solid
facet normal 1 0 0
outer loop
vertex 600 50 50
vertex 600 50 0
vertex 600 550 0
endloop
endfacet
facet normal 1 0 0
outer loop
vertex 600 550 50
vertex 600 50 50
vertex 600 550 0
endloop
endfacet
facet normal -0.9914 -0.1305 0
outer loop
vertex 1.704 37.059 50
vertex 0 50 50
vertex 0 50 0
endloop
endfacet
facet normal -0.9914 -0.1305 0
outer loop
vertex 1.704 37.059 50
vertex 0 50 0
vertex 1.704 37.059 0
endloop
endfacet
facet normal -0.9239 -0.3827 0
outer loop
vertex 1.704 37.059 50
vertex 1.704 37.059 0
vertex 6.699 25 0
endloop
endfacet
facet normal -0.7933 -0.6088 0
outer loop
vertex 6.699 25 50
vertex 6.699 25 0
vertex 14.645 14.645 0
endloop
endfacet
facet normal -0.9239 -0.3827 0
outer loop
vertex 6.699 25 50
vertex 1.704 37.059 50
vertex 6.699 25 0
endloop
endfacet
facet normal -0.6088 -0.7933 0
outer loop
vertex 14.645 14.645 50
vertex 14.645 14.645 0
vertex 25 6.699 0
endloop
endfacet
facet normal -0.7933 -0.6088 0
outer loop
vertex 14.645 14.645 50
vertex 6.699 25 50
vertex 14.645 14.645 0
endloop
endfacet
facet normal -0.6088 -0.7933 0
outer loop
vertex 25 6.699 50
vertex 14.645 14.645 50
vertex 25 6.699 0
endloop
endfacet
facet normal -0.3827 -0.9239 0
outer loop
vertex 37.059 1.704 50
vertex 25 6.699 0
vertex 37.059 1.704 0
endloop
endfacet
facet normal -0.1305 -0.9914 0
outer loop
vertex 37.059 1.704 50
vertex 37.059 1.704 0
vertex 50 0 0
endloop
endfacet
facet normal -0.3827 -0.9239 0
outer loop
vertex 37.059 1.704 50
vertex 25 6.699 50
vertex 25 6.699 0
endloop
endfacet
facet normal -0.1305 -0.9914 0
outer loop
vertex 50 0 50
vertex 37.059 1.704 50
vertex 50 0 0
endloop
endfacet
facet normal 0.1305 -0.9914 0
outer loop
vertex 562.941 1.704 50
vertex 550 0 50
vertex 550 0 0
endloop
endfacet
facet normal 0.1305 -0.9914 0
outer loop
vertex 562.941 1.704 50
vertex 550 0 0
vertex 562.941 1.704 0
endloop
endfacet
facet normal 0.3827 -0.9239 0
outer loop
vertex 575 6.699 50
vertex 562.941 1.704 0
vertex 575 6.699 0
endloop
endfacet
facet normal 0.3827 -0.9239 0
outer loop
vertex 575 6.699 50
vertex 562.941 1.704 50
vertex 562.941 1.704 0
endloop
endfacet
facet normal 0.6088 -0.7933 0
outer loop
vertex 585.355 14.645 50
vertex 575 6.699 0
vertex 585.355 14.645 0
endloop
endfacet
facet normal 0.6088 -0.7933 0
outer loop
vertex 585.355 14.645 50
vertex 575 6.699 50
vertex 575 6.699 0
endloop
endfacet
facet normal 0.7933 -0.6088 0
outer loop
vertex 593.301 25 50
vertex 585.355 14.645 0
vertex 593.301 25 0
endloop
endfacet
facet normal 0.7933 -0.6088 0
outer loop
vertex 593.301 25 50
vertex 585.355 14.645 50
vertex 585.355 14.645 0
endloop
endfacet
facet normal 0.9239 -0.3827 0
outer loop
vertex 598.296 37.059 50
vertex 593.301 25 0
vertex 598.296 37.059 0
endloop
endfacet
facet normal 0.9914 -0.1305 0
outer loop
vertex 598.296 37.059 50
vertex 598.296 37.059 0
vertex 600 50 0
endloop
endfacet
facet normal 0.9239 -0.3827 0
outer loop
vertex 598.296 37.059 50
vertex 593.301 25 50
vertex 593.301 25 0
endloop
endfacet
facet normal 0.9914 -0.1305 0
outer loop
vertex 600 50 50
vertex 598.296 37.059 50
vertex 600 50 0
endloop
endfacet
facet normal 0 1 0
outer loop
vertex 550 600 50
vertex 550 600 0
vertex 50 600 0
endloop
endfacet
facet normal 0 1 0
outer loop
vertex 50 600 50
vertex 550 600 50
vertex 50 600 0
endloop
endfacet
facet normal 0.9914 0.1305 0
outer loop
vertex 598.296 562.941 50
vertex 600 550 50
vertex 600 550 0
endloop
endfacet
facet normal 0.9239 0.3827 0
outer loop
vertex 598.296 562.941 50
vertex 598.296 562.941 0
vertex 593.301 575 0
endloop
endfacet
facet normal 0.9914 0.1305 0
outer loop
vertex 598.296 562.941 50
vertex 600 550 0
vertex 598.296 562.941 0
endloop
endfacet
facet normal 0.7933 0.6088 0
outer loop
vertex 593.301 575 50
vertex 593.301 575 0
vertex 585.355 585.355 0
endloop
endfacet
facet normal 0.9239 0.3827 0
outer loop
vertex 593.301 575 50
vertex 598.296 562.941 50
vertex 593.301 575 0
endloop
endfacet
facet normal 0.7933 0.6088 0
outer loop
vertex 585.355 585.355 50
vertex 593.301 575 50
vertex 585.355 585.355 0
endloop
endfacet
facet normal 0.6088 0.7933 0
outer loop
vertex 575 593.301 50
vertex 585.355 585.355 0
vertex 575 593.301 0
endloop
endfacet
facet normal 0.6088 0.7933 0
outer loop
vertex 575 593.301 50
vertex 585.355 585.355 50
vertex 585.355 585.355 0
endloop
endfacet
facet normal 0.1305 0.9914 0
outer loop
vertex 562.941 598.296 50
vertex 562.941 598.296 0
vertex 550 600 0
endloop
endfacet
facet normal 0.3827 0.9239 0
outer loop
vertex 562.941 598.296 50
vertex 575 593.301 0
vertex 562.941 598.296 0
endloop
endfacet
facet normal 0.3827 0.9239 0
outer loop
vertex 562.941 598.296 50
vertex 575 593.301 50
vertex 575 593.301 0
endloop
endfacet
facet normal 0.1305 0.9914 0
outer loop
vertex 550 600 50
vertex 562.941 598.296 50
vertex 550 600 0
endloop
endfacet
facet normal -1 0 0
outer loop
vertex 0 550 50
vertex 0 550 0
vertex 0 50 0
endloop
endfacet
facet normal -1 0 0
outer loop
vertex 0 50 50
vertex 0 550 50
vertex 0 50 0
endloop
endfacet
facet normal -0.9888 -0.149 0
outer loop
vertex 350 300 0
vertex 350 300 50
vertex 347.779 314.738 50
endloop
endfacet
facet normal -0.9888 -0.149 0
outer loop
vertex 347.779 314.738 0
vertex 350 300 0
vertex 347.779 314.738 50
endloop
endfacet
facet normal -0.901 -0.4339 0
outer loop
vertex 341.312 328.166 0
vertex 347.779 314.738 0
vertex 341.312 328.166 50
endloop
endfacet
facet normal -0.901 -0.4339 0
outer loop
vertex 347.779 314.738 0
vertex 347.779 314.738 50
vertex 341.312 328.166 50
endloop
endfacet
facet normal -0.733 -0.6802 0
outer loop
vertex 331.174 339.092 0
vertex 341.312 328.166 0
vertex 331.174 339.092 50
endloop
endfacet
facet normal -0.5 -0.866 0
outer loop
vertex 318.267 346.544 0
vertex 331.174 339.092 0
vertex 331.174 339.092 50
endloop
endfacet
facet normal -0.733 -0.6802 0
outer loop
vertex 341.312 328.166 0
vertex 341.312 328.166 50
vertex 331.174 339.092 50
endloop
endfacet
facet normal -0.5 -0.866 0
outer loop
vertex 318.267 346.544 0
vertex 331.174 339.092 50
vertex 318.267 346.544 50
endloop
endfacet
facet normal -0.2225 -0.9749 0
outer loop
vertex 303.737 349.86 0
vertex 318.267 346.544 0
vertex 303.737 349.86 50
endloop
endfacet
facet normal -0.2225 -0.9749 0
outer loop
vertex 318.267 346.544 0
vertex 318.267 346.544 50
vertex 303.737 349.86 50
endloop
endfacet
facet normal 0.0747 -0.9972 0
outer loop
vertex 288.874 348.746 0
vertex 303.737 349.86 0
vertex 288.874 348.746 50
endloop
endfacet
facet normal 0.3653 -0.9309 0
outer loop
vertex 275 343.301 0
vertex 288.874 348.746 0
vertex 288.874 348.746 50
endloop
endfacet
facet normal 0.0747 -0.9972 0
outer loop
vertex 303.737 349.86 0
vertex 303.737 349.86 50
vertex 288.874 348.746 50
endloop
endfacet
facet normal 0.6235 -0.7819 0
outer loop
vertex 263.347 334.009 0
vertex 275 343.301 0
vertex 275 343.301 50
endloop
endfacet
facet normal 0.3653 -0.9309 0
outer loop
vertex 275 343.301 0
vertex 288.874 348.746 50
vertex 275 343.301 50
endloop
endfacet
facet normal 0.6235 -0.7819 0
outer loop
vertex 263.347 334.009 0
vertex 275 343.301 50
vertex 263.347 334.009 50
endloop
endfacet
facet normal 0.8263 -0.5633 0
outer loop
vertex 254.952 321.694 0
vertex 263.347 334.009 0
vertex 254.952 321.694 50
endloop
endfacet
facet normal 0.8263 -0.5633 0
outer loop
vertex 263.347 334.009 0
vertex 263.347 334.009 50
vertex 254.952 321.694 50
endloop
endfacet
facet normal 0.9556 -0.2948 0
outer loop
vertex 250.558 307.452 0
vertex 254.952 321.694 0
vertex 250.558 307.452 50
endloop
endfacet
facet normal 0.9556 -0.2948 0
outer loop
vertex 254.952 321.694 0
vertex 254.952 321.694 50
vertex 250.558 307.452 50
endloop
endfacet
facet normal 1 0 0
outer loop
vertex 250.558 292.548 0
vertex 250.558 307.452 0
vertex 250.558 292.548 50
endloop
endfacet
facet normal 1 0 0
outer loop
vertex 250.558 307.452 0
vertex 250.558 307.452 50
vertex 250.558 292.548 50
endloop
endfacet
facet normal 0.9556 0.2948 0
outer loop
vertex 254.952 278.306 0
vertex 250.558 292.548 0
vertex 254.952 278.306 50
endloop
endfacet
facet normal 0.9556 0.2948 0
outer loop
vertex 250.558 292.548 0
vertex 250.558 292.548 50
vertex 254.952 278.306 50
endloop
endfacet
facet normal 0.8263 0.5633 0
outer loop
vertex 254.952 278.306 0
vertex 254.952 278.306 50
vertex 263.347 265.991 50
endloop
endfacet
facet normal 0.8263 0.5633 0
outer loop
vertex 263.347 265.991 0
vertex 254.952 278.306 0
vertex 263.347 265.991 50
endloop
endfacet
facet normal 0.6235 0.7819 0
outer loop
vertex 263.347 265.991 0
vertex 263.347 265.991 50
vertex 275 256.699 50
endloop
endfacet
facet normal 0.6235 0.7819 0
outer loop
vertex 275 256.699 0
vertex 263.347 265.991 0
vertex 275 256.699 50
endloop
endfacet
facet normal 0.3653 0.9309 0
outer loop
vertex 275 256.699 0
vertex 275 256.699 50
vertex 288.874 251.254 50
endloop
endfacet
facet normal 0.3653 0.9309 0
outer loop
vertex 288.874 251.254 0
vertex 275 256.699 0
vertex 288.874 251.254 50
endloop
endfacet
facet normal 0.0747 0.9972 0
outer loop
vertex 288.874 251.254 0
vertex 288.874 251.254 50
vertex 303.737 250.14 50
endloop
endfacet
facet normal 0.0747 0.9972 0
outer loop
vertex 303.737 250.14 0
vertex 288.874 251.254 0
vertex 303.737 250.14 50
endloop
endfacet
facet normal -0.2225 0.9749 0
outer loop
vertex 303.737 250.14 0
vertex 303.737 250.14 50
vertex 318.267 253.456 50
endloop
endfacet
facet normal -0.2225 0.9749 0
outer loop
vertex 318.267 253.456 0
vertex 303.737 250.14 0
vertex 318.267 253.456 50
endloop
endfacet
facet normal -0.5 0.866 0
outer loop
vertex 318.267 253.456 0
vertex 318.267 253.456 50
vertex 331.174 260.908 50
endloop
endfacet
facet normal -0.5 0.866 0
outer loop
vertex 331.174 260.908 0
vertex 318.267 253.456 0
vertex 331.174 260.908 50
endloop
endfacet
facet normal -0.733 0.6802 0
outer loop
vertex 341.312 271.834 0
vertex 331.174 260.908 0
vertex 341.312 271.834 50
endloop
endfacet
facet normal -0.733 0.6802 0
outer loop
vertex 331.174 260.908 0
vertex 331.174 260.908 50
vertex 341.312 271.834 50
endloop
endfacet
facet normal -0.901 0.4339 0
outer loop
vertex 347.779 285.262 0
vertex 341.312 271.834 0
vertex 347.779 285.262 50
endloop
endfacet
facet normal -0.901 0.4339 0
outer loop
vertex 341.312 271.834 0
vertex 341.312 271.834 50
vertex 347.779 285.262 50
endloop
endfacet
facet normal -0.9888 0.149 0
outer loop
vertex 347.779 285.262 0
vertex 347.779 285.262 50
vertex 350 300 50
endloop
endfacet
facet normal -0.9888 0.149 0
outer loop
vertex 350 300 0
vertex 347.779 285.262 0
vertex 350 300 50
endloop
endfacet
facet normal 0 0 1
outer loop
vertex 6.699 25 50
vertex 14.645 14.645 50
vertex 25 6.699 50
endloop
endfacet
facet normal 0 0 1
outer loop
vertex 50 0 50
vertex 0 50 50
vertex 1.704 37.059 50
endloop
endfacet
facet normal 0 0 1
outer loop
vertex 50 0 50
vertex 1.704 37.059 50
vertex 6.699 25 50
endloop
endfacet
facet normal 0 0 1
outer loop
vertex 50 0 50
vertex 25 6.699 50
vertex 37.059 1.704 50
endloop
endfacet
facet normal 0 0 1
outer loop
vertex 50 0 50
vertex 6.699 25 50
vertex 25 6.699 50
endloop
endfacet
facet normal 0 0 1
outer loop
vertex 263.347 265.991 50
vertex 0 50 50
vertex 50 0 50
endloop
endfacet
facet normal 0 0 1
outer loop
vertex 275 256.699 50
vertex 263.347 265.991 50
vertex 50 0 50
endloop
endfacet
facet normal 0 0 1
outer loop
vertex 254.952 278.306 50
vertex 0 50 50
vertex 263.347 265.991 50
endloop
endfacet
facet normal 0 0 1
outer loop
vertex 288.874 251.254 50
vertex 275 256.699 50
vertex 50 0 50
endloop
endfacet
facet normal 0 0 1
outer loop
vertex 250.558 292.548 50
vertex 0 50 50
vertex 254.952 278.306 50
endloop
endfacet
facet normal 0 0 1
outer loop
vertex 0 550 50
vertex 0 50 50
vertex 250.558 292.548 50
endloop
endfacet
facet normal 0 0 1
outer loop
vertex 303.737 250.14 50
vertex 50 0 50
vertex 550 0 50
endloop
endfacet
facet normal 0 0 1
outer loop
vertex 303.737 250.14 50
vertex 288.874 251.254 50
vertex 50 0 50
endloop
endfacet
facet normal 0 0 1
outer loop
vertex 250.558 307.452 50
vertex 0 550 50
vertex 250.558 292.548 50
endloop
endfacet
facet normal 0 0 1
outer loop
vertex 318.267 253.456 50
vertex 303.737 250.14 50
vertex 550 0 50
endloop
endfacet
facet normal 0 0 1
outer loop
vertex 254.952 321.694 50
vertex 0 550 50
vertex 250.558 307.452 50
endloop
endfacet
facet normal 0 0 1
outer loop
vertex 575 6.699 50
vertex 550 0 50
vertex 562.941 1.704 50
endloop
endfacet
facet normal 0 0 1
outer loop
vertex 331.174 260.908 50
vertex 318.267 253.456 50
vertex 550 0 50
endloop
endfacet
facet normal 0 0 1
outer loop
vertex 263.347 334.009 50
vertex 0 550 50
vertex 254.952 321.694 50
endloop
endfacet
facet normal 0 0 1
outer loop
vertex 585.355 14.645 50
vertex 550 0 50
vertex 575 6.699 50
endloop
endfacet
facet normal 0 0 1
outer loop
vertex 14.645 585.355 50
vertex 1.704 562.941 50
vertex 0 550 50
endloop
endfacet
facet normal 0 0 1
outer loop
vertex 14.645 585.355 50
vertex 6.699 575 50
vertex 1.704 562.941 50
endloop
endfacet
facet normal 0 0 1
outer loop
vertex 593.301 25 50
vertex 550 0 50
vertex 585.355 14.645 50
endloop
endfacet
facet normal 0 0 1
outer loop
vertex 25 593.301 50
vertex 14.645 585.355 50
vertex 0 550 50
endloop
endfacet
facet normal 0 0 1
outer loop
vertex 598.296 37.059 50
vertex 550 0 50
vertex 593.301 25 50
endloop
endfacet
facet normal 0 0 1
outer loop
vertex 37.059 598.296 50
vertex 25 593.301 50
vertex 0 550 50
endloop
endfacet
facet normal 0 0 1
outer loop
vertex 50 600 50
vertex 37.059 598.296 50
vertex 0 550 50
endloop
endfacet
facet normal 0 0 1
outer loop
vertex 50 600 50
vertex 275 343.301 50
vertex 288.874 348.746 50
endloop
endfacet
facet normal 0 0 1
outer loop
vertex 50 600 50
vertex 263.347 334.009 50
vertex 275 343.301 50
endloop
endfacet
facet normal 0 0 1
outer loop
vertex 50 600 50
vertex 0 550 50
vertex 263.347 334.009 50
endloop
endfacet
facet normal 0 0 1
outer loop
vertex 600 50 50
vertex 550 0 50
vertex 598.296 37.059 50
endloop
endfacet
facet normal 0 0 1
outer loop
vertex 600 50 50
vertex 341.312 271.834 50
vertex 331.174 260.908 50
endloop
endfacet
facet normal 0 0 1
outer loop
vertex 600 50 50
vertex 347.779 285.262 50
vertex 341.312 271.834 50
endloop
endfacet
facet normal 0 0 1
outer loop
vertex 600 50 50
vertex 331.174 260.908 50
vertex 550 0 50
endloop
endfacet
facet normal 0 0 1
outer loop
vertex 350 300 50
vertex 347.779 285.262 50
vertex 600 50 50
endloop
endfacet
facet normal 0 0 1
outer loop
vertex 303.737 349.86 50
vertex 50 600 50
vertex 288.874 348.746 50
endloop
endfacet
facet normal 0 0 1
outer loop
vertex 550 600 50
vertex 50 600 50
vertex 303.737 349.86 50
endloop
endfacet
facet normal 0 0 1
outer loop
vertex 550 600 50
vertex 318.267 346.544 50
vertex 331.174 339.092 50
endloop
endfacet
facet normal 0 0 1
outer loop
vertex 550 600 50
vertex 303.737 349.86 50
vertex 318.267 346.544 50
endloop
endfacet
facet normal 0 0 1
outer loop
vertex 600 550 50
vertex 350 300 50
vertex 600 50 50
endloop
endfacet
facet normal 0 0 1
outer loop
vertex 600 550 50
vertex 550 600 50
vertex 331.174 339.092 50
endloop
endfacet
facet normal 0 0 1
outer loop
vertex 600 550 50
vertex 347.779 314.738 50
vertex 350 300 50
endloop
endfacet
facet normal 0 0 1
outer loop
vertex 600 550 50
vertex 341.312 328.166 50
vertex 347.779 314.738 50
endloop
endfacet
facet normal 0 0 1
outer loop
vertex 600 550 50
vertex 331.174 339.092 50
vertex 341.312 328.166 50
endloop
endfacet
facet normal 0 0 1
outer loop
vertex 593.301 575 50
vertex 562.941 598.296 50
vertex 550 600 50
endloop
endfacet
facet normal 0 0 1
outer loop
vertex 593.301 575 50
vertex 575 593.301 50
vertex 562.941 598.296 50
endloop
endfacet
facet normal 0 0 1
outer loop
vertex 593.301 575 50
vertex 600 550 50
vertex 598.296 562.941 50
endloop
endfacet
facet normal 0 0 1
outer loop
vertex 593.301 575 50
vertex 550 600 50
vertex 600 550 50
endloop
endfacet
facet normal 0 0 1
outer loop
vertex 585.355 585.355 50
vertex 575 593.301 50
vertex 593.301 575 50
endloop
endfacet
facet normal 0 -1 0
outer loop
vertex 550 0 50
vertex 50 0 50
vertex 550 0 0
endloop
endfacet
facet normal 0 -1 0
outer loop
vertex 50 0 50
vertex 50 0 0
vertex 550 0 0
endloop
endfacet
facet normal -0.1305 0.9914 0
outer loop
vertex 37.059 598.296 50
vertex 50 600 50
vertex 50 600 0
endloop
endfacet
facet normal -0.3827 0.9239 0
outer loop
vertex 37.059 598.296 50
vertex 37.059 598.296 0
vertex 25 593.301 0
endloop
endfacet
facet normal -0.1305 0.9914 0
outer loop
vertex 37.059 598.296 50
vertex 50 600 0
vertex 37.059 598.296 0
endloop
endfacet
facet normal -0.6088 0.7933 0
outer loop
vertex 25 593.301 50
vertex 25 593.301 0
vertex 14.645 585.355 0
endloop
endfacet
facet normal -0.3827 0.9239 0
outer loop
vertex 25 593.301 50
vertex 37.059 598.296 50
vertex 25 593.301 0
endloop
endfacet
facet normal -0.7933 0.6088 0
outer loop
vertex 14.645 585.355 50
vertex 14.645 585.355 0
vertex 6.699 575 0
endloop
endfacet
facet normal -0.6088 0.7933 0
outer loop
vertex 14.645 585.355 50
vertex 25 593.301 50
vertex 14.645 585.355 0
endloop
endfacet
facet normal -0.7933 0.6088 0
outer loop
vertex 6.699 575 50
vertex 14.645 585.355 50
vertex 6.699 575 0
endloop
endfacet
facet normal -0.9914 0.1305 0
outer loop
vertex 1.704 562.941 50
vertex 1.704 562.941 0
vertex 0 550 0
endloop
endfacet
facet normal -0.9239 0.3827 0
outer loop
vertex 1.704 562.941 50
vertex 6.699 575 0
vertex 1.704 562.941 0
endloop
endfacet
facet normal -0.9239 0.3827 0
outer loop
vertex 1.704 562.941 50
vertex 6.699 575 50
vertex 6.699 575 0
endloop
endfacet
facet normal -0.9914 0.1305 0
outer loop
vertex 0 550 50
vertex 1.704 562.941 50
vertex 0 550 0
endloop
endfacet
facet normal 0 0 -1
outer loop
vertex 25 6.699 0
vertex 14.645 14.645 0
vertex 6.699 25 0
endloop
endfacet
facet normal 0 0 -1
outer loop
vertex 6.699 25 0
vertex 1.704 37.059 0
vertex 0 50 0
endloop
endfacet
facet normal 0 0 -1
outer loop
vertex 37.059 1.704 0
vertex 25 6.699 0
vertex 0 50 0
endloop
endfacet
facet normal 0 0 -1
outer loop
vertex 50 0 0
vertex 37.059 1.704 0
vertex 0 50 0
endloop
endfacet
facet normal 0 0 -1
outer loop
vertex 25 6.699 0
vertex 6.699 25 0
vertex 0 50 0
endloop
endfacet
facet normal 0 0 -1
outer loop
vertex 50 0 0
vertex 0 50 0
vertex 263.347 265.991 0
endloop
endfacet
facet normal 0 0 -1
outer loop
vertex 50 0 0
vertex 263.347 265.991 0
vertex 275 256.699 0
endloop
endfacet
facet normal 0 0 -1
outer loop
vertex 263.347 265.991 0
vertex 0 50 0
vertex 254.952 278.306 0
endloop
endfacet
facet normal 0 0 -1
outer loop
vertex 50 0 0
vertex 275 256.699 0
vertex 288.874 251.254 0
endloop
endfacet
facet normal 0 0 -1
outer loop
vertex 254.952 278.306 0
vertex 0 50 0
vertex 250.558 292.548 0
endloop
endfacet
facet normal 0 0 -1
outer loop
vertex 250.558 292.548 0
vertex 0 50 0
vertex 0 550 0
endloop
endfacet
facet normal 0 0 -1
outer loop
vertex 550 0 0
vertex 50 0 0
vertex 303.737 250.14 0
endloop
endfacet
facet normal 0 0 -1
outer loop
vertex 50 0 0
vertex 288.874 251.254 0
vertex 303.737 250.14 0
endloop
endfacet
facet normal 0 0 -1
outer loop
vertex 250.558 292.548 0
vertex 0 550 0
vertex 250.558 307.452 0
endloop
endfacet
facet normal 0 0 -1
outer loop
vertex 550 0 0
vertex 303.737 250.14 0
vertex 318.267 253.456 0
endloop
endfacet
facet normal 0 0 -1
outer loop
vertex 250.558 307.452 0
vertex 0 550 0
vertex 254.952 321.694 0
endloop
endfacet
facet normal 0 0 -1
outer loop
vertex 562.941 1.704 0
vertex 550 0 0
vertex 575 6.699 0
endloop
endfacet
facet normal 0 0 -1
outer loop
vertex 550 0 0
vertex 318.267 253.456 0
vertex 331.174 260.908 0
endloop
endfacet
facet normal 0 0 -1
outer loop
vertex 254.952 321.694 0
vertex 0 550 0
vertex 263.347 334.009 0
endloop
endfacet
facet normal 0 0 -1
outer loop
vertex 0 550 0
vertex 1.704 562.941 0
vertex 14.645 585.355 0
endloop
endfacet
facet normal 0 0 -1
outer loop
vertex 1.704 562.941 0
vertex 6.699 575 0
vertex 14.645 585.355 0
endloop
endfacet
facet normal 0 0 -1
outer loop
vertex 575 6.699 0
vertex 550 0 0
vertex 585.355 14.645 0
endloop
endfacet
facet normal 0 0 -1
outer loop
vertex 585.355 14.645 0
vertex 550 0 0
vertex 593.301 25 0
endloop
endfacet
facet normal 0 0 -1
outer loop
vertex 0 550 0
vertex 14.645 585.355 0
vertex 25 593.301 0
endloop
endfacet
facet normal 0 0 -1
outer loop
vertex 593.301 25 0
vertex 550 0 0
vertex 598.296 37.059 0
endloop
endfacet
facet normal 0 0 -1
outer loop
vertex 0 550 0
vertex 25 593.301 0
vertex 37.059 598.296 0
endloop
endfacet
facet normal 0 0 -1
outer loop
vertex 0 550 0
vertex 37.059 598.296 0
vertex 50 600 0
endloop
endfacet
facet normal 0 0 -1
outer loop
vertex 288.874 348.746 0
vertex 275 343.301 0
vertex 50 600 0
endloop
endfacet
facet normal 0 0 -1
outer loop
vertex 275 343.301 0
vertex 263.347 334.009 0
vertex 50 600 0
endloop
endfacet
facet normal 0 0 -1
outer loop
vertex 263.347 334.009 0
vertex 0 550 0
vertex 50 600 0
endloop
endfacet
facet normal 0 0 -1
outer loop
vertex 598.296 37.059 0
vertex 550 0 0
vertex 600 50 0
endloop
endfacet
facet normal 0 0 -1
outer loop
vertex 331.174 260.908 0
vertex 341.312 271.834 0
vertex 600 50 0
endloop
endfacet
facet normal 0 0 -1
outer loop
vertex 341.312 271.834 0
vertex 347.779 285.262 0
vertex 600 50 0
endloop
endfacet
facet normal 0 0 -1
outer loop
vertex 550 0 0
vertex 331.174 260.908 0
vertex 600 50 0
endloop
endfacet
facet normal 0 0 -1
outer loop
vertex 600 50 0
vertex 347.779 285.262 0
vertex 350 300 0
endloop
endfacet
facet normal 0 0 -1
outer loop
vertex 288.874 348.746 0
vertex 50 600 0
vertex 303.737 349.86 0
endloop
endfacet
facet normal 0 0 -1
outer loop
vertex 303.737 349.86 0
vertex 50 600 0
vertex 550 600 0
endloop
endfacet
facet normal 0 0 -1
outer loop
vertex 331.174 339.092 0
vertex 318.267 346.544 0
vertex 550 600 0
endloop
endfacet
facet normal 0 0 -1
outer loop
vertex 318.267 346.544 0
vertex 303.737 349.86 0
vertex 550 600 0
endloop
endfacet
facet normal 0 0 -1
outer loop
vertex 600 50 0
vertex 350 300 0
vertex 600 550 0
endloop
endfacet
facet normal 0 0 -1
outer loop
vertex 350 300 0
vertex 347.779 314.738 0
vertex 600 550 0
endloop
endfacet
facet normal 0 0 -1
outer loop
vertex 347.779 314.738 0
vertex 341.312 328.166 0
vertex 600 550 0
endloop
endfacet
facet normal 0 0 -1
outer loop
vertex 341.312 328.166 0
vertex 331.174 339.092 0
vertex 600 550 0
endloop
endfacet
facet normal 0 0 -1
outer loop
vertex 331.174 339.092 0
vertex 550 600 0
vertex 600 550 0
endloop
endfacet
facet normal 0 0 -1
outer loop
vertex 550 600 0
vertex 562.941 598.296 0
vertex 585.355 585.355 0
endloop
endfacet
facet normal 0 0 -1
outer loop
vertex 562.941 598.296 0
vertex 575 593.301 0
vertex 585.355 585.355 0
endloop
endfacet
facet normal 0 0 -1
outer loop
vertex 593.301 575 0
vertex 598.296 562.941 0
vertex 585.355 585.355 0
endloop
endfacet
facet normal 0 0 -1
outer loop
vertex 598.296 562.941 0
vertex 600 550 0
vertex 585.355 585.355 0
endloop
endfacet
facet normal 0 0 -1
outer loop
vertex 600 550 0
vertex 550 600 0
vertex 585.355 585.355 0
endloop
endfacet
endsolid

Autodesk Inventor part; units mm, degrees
ref_plane "YZ Plane" through (0, 0, 0) normal (1, 0, 0) x (0, 1, 0)
ref_plane "XZ Plane" through (0, 0, 0) normal (0, 1, 0) x (-1, 0, 0)
ref_plane "XY Plane" through (0, 0, 0) normal (0, 0, 1) x (1, 0, 0)
sketch "Sketch1" plane through (0, 0, 0) normal (0, 0, 1) x (1, 0, 0)
  line L0 (0, 0) -> (600, 0)
  line L1 (600, 0) -> (600, 600)
  line L2 (600, 600) -> (0, 600)
  line L3 (0, 600) -> (0, 0)
  circle A0 centre (300, 300) radius 50
  dimension "d0" = 600
  dimension "d1" = 600
  dimension "d5" = 100
extrude "Extrusion1" add sketch "Sketch1" along normal blind 50 contours L3 L2 L1 L0 | A0
fillet "Fillet1" radius 50 4 edges at (0, 600, 25) (600, 600, 25) (600, 0, 25) (0, 0, 25)
sketch "Sketch2" plane through (0, 0, 50) normal (0, 0, 1) x (1, 0, 0)
  circle A0 centre (300, 300) radius 50
  line L0 (50, 0) -> (550, 0) projected
  line L1 (550, 600) -> (50, 600) projected
  line L2 (600, 50) -> (600, 550) projected
  point P0 (0, 0)
  point P1 (300, 0)
  dimension "d6" = 100
  dimension "d7" = 300
  dimension "d8" = 300
  dimension "d9" = 300
extrude "Extrusion2" cut sketch "Sketch2" against normal through all
properties part number "Part1Grroundfinal"
